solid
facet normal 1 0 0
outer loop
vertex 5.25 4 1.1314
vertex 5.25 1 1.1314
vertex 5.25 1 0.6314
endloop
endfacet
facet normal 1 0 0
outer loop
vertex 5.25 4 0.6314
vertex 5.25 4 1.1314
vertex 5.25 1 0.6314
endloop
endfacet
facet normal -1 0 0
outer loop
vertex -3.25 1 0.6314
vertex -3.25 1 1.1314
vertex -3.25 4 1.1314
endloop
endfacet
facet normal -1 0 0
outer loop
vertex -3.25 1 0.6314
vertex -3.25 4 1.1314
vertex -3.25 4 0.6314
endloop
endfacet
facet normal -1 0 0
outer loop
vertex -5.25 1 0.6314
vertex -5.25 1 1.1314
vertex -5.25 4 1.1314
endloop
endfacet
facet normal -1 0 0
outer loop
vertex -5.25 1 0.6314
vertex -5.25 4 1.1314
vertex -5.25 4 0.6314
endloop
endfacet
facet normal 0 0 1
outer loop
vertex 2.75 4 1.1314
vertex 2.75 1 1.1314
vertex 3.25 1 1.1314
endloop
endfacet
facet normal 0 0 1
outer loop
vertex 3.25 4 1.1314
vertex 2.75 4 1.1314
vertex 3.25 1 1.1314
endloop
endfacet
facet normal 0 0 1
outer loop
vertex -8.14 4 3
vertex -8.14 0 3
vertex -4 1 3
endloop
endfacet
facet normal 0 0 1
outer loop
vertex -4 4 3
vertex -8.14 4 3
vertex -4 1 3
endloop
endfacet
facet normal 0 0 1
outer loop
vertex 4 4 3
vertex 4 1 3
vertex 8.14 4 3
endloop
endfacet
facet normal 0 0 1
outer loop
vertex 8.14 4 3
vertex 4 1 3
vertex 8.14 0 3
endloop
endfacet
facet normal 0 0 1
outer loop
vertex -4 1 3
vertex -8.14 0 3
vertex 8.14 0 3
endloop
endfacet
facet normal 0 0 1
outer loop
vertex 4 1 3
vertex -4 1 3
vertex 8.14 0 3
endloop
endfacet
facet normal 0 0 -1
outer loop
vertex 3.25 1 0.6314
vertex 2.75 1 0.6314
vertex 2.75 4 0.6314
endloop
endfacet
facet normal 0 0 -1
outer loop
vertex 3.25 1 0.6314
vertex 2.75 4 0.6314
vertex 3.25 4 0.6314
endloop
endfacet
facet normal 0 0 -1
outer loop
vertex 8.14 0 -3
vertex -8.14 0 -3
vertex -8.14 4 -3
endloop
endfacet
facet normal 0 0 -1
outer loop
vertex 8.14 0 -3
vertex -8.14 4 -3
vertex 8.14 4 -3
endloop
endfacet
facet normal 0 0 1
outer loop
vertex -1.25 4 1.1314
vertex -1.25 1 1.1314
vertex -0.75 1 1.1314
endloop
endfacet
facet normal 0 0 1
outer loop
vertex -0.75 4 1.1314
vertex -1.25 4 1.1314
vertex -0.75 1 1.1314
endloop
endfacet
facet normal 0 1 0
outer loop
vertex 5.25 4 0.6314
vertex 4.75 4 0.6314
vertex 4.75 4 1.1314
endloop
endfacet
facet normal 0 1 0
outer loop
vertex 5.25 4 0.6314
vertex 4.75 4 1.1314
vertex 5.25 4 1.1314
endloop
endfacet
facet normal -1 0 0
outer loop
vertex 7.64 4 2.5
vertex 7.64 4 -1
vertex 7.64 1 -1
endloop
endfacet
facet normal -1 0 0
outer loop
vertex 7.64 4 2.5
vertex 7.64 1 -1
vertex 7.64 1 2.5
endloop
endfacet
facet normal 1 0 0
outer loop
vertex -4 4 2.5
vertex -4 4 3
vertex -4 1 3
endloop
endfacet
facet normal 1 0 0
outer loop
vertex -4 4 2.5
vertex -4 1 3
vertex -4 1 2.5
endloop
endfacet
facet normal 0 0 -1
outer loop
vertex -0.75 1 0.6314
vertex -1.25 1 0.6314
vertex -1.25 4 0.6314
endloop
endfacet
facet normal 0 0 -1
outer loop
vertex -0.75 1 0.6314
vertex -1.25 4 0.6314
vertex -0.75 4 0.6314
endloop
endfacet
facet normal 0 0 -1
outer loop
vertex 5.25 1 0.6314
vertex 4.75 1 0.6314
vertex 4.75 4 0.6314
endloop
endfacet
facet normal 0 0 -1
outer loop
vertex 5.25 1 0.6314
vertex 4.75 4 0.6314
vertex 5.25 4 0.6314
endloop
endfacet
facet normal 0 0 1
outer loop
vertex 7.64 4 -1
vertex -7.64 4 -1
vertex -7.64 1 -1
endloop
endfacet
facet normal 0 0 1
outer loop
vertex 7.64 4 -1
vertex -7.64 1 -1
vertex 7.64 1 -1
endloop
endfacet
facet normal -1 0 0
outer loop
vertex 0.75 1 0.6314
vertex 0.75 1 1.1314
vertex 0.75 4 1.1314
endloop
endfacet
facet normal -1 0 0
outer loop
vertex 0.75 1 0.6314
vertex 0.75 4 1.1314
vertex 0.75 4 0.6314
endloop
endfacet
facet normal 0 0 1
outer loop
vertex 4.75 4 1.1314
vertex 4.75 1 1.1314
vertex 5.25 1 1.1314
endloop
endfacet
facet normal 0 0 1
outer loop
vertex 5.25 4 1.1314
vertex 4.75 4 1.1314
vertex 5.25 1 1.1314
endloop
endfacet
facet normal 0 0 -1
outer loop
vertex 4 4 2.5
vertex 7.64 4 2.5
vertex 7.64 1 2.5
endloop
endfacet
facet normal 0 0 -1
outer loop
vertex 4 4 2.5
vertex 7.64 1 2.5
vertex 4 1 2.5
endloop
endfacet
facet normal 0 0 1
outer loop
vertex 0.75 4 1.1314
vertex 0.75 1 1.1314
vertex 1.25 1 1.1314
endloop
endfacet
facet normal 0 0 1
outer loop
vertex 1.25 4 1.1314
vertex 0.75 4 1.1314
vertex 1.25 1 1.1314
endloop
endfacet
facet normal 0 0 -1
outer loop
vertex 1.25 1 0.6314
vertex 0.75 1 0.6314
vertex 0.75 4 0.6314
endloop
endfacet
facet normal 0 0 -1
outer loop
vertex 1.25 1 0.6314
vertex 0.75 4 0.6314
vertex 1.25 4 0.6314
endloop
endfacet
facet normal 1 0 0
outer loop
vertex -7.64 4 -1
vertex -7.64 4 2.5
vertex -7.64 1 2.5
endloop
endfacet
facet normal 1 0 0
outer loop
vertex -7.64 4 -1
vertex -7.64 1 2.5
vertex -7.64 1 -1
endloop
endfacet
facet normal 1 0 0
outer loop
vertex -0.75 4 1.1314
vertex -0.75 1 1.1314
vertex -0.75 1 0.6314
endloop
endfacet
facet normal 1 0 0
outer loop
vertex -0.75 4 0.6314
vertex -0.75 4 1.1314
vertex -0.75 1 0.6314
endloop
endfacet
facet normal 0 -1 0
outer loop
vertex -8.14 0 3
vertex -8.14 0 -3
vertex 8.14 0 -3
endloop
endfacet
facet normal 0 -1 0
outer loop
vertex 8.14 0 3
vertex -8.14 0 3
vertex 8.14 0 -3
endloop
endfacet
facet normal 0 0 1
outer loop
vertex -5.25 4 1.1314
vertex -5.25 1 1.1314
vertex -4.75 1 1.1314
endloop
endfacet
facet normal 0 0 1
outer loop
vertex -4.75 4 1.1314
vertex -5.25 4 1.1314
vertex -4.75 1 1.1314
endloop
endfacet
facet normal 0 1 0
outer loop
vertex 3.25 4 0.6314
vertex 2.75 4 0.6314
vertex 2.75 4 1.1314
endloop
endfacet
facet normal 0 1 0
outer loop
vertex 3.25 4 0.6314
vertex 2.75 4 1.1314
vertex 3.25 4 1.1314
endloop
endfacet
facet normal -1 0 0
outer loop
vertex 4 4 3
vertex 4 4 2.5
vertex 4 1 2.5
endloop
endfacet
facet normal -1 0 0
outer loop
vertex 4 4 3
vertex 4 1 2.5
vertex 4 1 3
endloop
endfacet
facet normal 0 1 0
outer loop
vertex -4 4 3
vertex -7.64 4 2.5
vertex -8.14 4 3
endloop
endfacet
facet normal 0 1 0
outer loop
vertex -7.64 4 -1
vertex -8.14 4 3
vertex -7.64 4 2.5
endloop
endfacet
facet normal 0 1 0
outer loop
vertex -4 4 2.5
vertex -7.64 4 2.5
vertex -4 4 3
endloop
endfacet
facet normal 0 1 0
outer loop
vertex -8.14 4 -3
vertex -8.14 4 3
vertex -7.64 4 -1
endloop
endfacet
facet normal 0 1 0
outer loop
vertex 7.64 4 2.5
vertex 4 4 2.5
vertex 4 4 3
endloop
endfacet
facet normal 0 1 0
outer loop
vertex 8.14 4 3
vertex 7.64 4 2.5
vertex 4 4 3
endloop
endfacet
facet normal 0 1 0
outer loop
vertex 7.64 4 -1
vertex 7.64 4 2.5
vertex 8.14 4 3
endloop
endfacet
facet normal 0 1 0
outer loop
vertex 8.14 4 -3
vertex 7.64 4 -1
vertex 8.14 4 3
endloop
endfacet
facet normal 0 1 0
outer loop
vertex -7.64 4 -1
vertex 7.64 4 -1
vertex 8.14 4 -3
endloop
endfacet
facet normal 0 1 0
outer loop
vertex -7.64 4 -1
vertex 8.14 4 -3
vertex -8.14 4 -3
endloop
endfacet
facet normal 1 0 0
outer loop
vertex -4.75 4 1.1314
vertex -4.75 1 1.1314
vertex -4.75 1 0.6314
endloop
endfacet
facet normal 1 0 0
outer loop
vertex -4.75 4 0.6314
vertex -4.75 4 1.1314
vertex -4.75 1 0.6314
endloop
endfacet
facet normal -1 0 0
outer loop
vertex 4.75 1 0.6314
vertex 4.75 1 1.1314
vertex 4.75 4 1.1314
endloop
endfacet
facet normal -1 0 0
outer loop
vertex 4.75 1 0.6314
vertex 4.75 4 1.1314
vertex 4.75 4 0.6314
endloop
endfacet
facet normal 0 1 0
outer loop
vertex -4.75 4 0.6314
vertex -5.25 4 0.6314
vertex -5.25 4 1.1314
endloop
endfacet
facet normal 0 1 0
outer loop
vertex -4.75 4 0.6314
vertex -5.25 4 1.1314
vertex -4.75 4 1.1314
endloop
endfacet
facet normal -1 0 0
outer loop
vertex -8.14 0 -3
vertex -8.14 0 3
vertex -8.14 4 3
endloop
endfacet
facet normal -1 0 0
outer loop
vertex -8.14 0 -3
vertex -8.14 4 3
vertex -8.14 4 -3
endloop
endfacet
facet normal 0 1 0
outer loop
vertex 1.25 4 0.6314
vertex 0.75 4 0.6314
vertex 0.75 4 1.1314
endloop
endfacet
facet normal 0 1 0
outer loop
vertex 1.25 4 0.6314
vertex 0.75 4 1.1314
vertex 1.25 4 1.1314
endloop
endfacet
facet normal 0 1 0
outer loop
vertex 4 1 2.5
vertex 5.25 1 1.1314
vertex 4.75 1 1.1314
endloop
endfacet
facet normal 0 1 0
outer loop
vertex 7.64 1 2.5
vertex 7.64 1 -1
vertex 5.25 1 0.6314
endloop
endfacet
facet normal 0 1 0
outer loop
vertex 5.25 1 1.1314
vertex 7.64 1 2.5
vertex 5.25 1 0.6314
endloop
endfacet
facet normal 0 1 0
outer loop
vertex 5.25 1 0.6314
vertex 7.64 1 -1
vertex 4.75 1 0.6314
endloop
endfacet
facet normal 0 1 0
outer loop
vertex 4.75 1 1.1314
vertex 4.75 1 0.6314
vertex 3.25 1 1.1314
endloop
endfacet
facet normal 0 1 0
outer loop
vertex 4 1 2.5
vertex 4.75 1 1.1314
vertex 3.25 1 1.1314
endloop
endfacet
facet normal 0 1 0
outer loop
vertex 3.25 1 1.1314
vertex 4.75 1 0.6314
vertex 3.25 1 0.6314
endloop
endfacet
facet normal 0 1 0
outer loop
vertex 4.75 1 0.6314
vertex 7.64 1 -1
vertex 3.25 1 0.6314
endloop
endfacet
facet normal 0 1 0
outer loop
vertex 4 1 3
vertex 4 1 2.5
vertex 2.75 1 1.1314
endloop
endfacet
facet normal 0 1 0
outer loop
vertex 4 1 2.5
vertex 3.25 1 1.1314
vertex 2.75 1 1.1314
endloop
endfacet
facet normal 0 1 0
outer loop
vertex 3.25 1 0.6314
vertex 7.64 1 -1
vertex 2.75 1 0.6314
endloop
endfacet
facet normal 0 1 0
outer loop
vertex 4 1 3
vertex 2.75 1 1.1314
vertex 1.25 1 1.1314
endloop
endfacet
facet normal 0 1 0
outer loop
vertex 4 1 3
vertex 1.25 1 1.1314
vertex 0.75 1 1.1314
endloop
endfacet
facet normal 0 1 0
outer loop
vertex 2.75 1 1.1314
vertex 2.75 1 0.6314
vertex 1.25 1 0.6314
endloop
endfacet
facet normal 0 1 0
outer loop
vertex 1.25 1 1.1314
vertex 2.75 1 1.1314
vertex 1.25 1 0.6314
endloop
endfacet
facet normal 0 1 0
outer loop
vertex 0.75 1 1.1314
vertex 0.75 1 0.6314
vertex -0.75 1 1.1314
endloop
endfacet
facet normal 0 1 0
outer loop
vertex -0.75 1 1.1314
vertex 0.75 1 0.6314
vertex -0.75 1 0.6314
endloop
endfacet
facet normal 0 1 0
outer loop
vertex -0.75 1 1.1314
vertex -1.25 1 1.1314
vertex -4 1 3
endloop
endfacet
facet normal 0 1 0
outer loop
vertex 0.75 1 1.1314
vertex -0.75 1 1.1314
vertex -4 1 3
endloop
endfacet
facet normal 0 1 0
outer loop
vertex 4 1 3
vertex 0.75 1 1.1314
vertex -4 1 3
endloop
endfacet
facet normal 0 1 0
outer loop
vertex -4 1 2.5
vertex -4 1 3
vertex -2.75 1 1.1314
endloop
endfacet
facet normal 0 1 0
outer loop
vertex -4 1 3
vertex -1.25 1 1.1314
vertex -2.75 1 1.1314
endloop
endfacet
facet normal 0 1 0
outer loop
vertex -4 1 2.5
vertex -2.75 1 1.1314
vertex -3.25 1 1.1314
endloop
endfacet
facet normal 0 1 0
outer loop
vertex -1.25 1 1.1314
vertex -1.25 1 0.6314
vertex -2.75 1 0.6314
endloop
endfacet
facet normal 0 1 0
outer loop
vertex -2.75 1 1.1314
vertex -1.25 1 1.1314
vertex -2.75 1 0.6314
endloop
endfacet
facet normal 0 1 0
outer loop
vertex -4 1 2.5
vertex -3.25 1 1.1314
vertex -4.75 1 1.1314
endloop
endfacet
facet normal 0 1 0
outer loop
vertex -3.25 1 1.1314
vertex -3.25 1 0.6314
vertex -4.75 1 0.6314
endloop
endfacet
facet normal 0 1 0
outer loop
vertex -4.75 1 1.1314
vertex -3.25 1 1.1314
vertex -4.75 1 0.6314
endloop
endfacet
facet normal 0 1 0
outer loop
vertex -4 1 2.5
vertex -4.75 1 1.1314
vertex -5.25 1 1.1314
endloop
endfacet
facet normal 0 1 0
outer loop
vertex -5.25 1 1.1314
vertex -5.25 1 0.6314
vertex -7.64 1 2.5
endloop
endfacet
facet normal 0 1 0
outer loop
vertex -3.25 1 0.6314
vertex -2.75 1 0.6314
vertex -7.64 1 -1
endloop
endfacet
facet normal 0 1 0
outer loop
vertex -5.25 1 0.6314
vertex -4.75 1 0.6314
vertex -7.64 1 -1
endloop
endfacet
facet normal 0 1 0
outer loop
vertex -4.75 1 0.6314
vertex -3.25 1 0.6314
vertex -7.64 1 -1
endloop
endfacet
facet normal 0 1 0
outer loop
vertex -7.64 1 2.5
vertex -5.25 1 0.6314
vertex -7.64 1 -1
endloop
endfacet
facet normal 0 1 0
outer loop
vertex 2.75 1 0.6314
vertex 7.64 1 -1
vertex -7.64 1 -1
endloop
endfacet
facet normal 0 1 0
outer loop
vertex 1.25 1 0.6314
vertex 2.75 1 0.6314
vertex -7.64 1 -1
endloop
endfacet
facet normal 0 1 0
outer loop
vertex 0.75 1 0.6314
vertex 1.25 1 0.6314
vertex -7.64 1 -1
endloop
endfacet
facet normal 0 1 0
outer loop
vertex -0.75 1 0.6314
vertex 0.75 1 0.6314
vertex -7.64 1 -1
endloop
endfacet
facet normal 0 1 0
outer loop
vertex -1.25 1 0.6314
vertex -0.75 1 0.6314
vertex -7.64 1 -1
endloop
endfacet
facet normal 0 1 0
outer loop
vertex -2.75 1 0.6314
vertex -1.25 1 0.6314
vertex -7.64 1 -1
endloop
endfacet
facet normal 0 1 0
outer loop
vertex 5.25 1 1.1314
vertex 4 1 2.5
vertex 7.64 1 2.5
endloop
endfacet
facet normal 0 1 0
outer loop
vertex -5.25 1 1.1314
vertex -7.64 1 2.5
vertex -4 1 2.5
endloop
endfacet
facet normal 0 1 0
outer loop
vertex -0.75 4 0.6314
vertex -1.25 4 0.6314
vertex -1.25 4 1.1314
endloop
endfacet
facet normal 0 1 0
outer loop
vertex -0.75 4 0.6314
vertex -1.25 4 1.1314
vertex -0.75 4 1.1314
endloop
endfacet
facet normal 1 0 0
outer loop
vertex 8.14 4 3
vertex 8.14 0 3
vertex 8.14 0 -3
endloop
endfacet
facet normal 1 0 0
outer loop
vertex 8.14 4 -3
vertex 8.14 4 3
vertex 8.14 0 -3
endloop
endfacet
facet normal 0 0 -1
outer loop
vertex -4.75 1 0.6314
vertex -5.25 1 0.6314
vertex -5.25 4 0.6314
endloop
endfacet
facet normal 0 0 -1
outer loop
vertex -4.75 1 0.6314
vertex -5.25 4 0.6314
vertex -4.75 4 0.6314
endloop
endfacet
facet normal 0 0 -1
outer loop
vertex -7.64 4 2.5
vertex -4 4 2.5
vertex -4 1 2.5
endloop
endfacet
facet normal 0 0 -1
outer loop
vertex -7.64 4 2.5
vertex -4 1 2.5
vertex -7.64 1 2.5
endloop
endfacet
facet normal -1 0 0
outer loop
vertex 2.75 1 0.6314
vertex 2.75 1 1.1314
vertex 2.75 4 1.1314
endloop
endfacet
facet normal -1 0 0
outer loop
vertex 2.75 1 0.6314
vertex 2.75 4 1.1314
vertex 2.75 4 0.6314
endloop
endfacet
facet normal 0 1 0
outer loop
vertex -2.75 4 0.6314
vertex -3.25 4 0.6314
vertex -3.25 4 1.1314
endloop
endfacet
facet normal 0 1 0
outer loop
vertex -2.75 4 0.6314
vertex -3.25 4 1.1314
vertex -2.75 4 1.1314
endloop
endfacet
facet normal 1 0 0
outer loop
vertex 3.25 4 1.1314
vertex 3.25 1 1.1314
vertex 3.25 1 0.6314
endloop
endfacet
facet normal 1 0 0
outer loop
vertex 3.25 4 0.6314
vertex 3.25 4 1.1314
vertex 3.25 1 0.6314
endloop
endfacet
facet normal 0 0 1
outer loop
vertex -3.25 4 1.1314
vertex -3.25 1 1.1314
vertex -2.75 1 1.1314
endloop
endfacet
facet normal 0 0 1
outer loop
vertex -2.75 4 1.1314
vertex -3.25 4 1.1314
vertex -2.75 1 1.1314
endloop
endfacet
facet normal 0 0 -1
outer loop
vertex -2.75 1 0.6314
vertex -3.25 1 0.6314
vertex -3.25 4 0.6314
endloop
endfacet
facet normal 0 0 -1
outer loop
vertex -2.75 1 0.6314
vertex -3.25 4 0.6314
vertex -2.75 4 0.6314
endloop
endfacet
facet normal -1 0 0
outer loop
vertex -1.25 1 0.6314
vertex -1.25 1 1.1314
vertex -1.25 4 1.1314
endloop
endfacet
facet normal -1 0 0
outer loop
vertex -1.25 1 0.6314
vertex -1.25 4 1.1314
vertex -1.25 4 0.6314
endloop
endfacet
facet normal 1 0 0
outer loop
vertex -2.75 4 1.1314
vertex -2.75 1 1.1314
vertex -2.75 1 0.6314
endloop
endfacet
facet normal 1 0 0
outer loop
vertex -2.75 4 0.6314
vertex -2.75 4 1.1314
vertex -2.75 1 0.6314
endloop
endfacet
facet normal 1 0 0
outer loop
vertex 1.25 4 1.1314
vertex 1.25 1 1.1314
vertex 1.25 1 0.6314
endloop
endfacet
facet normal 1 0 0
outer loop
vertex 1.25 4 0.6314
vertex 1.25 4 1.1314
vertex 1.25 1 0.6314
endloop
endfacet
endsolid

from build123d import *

# Parameters (mm, degrees)
SKETCH1_W           = 16.28
SKETCH1_H           = 6
BOSS_EXTRUDE1_DEPTH = 4
CUT_EXTRUDE1_DEPTH  = 3
SKETCH4_W           = 0.5
SKETCH4_H           = 0.5
BOSS_EXTRUDE2_DEPTH = 3


with BuildPart() as part:
    # Sketch1 → Boss-Extrude1 (new body)
    with BuildSketch(Plane(origin=(0, 0, 0), x_dir=(1, 0, 0), z_dir=(0, 1, 0))):
        Rectangle(SKETCH1_W, SKETCH1_H)
    extrude(amount=BOSS_EXTRUDE1_DEPTH)

    # Sketch2 → Cut-Extrude1 (cut)
    with BuildSketch(Plane(origin=(0, 4, 0), x_dir=(1, 0, 0), z_dir=(0, 1, 0))):
        Polygon((-7.64, -2.5), (-7.64, 1), (7.64, 1), (7.64, -2.5), (4, -2.5), (4, -3), (-4, -3), (-4, -2.5), align=None)
    extrude(amount=-CUT_EXTRUDE1_DEPTH, mode=Mode.SUBTRACT)

    # Sketch4 → Boss-Extrude2 (add)
    with BuildSketch(Plane(origin=(0, 1, 0), x_dir=(1, 0, 0), z_dir=(0, 1, 0))):
        with Locations((-3, -0.881352283)):
            Rectangle(SKETCH4_W, SKETCH4_H)
        with Locations((-5, -0.881352283)):
            Rectangle(SKETCH4_W, SKETCH4_H)
        with Locations((-1, -0.881352283)):
            Rectangle(SKETCH4_W, SKETCH4_H)
        with Locations((1, -0.881352283)):
            Rectangle(SKETCH4_W, SKETCH4_H)
        with Locations((3, -0.881352283)):
            Rectangle(SKETCH4_W, SKETCH4_H)
        with Locations((5, -0.881352283)):
            Rectangle(SKETCH4_W, SKETCH4_H)
    extrude(amount=BOSS_EXTRUDE2_DEPTH)


solid = part.part
